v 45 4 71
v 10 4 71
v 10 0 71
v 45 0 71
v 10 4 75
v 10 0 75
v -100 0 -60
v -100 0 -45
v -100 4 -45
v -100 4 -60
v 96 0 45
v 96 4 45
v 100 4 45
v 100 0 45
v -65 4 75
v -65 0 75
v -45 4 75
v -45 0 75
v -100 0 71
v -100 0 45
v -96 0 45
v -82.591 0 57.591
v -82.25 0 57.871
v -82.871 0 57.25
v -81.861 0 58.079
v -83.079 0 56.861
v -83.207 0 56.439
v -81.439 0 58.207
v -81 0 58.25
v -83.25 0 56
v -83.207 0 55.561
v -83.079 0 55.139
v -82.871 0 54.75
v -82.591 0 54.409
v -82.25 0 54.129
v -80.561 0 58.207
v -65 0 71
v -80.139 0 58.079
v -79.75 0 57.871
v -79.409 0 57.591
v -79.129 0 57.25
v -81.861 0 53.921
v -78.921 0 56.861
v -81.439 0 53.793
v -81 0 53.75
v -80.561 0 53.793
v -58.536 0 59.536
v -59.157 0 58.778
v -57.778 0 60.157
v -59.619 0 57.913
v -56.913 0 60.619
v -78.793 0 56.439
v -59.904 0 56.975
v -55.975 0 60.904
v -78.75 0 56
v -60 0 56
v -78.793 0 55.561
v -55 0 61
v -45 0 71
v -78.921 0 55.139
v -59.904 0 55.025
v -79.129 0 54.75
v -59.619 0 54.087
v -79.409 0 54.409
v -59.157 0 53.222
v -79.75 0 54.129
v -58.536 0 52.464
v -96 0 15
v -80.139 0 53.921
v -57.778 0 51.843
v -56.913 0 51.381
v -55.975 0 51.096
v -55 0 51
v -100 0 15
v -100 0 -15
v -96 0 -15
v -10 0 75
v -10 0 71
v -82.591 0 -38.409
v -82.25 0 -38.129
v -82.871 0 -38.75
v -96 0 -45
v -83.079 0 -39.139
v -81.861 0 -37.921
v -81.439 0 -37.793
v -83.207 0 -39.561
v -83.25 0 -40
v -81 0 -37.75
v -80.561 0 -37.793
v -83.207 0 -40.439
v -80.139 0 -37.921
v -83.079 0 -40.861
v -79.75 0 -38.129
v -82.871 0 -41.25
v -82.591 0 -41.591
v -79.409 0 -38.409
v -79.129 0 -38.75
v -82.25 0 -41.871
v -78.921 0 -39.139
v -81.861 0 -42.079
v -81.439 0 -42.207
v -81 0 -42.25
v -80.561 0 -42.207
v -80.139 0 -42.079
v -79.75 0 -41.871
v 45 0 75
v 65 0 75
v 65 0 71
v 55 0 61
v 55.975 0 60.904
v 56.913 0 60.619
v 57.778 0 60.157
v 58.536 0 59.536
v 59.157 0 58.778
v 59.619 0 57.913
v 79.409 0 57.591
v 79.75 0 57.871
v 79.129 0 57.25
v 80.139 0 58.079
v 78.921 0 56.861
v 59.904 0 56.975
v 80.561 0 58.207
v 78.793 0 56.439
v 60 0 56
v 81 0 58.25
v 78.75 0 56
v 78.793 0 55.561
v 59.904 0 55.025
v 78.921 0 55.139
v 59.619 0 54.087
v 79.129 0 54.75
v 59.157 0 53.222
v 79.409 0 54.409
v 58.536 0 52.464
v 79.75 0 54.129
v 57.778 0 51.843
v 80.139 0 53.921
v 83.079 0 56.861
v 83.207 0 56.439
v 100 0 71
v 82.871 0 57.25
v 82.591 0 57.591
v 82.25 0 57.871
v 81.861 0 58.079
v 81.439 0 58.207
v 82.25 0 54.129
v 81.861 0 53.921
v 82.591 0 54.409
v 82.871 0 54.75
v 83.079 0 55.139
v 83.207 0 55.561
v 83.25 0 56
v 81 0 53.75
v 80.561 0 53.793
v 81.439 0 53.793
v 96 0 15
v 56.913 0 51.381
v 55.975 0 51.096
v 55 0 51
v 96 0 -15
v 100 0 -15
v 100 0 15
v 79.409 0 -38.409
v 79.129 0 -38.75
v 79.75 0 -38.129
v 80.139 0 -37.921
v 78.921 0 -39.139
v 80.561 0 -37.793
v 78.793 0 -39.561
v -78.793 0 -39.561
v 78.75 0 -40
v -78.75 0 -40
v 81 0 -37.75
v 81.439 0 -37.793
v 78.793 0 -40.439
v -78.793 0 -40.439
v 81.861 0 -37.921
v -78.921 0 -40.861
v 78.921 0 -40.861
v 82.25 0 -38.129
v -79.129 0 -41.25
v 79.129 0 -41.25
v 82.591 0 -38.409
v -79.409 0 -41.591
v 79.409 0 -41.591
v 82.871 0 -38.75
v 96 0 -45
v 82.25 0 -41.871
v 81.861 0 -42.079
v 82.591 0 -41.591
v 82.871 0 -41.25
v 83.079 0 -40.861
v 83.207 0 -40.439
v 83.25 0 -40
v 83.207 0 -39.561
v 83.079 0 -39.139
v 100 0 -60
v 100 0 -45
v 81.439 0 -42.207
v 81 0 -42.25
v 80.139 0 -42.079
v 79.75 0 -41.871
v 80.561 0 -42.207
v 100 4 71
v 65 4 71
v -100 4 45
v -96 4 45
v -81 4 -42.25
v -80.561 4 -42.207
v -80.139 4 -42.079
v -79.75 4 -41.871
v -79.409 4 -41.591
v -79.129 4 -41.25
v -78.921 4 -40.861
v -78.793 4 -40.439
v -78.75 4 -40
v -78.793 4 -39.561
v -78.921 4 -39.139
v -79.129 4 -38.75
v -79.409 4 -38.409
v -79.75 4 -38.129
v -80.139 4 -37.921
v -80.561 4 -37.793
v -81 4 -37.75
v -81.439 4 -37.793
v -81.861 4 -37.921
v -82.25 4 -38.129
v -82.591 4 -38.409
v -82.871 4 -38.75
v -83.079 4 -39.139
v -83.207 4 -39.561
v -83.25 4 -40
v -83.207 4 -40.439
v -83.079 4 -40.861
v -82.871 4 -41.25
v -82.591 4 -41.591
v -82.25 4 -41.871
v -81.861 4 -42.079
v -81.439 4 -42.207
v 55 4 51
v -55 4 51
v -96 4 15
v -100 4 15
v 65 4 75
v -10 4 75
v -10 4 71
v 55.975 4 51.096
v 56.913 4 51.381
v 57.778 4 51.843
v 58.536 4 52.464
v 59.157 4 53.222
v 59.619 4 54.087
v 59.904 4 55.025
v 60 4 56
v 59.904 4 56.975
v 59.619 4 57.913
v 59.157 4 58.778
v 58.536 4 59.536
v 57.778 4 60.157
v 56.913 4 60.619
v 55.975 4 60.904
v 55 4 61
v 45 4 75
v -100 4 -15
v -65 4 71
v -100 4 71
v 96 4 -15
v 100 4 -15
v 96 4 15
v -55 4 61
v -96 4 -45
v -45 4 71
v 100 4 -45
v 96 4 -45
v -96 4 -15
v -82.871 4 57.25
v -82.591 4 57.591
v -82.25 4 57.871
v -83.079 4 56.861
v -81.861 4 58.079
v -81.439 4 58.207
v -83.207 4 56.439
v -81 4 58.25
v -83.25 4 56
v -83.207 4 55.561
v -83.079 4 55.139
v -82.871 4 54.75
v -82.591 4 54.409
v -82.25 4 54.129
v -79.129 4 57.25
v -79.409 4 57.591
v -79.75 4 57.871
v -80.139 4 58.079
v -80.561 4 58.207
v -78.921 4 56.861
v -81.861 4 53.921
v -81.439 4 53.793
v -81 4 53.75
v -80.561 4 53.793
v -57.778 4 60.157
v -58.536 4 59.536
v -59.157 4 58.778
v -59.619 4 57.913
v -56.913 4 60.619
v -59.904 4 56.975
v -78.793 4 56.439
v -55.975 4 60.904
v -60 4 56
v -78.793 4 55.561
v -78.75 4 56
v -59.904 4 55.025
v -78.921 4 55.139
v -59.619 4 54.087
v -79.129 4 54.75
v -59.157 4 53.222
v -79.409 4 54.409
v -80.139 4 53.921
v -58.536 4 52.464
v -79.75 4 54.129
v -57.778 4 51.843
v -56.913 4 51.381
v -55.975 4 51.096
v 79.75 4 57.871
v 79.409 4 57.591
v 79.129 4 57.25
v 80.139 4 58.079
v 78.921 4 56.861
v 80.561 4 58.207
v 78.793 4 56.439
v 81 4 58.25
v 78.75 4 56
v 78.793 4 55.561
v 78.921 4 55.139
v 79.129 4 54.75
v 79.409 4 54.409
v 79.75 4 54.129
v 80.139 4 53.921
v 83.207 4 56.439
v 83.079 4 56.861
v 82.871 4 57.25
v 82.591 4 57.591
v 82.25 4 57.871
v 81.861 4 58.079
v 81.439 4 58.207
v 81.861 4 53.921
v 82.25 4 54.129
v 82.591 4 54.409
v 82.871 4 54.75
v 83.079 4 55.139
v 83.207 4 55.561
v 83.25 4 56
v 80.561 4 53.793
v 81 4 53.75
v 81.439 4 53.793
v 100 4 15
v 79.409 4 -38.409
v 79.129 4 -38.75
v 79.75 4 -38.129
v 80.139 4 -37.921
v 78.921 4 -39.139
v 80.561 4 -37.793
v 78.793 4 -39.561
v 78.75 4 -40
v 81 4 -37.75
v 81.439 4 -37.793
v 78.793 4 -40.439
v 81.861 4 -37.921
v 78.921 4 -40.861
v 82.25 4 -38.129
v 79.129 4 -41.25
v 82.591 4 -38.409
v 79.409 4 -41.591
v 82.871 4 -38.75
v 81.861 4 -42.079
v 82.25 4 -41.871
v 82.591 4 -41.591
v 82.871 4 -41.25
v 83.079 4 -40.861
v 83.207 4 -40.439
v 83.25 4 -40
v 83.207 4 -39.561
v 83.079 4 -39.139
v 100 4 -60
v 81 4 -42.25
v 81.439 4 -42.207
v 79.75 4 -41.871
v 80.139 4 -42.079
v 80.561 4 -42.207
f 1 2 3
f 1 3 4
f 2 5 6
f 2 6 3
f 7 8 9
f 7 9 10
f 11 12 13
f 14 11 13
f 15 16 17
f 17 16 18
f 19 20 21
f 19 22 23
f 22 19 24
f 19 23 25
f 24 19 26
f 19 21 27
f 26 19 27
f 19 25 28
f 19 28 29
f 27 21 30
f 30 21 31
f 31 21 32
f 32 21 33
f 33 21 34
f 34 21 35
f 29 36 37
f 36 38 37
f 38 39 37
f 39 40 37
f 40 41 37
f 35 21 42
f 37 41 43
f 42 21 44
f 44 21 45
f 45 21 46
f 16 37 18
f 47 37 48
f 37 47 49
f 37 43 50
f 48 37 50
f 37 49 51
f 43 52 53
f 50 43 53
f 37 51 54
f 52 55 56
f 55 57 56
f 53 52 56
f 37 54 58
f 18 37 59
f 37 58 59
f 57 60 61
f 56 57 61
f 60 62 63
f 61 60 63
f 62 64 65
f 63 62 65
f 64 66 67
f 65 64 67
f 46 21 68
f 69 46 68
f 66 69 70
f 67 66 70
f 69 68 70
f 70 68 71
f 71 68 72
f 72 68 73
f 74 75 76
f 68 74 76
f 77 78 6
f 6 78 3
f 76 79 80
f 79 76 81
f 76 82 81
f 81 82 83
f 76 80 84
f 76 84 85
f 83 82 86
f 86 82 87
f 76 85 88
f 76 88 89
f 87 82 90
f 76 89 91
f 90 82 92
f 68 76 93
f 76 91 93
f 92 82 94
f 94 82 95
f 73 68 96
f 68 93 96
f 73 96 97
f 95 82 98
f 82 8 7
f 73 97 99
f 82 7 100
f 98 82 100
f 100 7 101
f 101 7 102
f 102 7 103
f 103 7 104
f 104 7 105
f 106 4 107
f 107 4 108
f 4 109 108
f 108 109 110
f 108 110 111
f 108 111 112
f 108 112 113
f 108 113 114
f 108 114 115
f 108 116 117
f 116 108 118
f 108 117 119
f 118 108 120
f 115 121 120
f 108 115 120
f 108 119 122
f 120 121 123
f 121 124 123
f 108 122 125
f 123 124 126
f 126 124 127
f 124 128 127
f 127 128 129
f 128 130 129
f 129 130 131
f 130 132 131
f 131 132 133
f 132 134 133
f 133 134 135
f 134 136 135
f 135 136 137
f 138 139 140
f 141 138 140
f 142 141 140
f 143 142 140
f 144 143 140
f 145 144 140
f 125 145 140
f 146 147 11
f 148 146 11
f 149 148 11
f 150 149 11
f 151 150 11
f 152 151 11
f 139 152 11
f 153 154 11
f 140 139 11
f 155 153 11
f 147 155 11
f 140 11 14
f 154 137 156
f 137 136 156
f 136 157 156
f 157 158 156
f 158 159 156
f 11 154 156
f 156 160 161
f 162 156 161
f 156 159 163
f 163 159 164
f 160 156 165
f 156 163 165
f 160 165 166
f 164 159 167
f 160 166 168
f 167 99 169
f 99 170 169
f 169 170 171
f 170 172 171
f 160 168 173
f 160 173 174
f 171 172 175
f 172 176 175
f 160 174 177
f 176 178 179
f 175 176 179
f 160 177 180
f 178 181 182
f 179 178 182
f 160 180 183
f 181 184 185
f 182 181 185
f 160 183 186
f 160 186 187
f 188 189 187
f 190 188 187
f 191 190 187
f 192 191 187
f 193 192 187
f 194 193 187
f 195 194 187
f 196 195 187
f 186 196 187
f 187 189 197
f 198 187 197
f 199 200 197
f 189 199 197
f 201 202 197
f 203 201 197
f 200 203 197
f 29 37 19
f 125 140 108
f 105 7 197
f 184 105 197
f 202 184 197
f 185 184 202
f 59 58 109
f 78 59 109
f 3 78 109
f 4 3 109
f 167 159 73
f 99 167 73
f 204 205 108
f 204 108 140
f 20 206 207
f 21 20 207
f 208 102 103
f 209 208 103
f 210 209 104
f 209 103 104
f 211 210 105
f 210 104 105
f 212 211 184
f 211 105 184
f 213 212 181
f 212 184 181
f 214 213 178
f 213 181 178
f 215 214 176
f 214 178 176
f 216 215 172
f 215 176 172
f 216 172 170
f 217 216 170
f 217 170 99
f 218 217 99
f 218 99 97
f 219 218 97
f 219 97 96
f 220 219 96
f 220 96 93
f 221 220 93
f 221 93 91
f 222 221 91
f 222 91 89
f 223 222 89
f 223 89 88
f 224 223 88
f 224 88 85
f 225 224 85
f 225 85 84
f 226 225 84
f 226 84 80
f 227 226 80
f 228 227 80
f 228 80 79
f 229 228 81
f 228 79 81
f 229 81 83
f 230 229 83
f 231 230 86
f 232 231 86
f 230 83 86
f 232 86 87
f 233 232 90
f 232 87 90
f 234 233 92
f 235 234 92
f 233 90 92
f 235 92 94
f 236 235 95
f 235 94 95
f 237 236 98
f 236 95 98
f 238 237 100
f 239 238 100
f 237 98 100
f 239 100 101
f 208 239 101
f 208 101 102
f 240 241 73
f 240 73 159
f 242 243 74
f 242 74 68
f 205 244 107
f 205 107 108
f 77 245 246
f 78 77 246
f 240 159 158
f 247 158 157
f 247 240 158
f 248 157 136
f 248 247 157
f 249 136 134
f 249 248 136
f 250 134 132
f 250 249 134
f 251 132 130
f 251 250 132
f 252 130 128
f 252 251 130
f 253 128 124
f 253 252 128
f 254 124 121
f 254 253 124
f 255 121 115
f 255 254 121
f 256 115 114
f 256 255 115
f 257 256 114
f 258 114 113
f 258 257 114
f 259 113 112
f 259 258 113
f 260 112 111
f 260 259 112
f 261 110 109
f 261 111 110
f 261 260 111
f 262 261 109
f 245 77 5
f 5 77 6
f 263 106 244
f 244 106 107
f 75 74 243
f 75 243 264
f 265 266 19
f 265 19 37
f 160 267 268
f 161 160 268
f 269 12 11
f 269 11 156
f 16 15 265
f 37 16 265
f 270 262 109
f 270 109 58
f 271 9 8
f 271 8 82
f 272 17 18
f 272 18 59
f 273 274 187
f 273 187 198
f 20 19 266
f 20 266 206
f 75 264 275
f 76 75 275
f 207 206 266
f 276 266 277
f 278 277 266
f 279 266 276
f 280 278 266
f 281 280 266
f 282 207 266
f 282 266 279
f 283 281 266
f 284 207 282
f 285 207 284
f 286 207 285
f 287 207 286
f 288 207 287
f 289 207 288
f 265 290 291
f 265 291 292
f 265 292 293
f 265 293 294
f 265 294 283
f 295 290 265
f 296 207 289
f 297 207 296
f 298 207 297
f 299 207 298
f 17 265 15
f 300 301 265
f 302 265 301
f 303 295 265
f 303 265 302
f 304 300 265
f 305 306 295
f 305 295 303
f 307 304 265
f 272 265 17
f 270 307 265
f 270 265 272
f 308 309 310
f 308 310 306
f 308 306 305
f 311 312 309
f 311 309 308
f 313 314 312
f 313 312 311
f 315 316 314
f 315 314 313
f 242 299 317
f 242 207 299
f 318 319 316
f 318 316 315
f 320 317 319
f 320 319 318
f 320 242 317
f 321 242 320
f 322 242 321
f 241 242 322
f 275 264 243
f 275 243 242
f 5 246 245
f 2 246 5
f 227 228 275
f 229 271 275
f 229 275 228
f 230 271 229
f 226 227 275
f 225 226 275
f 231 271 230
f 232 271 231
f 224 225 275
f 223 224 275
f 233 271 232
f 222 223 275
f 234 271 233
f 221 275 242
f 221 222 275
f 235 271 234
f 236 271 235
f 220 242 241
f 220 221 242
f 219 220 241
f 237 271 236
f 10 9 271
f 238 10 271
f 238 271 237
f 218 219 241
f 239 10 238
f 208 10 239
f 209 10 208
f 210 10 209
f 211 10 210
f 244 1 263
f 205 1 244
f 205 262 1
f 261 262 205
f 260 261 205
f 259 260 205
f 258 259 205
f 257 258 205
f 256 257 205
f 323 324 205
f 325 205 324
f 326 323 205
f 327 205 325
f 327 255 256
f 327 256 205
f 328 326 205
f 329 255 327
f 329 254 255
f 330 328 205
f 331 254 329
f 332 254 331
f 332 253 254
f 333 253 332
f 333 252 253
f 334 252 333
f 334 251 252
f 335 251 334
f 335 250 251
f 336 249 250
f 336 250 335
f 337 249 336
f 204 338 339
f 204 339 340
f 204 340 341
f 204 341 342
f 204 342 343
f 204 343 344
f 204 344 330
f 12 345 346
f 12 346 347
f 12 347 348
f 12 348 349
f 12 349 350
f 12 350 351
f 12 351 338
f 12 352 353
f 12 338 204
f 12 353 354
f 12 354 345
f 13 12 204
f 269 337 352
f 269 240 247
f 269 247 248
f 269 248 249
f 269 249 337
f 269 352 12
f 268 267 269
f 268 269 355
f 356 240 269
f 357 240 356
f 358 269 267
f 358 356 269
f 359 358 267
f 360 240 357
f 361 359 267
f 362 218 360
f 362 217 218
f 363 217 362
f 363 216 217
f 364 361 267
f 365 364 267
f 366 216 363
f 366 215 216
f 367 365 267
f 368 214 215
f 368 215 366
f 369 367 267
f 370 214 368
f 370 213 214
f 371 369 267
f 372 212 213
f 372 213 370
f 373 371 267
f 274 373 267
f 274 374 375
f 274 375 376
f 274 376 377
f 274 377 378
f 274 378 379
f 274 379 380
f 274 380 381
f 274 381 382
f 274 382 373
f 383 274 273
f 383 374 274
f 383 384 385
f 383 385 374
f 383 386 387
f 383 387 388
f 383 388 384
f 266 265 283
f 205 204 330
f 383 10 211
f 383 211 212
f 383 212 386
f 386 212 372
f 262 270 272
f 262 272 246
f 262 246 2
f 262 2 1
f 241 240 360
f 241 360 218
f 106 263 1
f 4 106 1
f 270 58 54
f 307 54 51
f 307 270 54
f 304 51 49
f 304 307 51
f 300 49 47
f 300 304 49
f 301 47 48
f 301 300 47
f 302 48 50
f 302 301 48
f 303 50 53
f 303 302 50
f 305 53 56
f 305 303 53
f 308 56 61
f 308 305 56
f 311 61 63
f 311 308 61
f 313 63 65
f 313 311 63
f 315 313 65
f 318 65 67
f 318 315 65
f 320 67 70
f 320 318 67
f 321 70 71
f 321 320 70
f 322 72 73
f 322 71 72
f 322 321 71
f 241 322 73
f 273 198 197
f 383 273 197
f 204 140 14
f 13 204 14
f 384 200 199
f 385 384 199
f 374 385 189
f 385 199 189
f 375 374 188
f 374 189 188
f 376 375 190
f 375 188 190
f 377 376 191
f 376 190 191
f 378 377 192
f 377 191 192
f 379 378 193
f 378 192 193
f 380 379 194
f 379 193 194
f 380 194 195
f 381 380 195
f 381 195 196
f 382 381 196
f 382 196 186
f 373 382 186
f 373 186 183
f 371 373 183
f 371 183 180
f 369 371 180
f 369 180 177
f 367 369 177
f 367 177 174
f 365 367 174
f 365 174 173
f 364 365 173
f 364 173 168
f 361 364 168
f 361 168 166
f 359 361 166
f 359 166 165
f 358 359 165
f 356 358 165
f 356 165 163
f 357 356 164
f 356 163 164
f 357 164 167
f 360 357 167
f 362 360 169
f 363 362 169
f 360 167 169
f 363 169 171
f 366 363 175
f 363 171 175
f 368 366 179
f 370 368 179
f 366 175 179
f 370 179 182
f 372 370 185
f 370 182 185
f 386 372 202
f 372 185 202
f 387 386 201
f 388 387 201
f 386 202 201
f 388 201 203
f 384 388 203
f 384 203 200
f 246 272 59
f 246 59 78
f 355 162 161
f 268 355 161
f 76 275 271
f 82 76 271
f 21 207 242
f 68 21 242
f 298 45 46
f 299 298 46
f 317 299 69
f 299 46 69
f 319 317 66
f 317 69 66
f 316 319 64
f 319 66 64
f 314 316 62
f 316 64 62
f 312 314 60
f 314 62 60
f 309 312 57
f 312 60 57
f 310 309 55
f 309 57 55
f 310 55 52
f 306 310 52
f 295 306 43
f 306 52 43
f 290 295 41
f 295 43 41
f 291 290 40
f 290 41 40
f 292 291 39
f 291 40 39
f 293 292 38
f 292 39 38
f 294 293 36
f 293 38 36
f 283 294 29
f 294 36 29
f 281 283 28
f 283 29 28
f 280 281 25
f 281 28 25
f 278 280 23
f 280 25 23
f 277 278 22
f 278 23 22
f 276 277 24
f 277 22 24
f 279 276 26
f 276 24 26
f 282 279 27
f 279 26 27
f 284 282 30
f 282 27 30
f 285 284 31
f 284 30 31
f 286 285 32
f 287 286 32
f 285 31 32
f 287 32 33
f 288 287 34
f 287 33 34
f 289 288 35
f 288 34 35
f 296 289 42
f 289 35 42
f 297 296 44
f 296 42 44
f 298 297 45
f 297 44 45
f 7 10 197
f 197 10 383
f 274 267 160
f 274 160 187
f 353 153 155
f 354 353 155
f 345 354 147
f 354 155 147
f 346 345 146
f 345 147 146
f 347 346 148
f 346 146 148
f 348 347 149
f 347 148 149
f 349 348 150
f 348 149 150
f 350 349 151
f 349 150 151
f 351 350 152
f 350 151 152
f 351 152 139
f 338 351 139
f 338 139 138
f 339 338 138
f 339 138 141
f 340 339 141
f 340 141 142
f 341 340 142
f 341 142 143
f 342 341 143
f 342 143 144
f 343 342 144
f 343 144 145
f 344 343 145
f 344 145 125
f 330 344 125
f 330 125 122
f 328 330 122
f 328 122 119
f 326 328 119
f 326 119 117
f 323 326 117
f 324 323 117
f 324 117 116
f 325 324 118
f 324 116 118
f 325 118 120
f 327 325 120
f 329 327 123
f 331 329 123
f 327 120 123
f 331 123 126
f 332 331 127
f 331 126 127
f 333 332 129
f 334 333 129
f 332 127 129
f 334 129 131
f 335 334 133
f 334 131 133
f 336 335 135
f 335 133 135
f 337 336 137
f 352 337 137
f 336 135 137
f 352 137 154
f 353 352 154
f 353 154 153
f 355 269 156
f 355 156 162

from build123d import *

# Parameters (mm, degrees)
ESBO_O1_W                               = 200
ESBO_O1_H                               = 150
RESSALTO_EXTRUS_O1_DEPTH                = 4
ESBO_O2_W                               = 35
ESBO_O2_H                               = 4
ESBO_O2_W_2                             = 4
ESBO_O2_H_2                             = 30
CORTE_EXTRUS_O1_DEPTH                   = 5
ESBO_O3_W                               = 200
ESBO_O3_H                               = 15
CORTE_EXTRUS_O2_DEPTH                   = 5
BROCA_DE_ROSQUEAR_PARA_TARRAXA_DE_M41_D = 4.5
ESBO_O5_R                               = 2.25
CORTE_EXTRUS_O3_DEPTH                   = 5


with BuildPart() as part:
    # Esboço1 → Ressalto-extrusão1 (new body)
    with BuildSketch(Plane(origin=(0, 0, 0), x_dir=(1, 0, 0), z_dir=(0, 1, 0))):
        Rectangle(ESBO_O1_W, ESBO_O1_H)
    extrude(amount=RESSALTO_EXTRUS_O1_DEPTH)

    # Esboço2 → Corte-extrusão1 (cut, through all)
    with BuildSketch(Plane(origin=(0, 4, 0), x_dir=(1, 0, 0), z_dir=(0, 1, 0))):
        with Locations((-27.5, -73)):
            Rectangle(ESBO_O2_W, ESBO_O2_H)
        with Locations((27.5, -73)):
            Rectangle(ESBO_O2_W, ESBO_O2_H)
        with Locations((82.5, -73)):
            Rectangle(ESBO_O2_W, ESBO_O2_H)
        with Locations((-82.5, -73)):
            Rectangle(ESBO_O2_W, ESBO_O2_H)
        with Locations((98, 30)):
            Rectangle(ESBO_O2_W_2, ESBO_O2_H_2)
        with Locations((98, -30)):
            Rectangle(ESBO_O2_W_2, ESBO_O2_H_2)
        with Locations((-98, 30)):
            Rectangle(ESBO_O2_W_2, ESBO_O2_H_2)
        with Locations((-98, -30)):
            Rectangle(ESBO_O2_W_2, ESBO_O2_H_2)
    extrude(amount=-CORTE_EXTRUS_O1_DEPTH, mode=Mode.SUBTRACT)

    # Esboço3 → Corte-extrusão2 (cut, through all)
    with BuildSketch(Plane(origin=(0, 4, 0), x_dir=(1, 0, 0), z_dir=(0, 1, 0))):
        with Locations((0, 67.5)):
            Rectangle(ESBO_O3_W, ESBO_O3_H)
    extrude(amount=-CORTE_EXTRUS_O2_DEPTH, mode=Mode.SUBTRACT)

    # Broca de rosquear para tarraxa de M41 (through all)
    with Locations(Plane(origin=(-81, 4, -40), x_dir=(0, 0, 1), z_dir=(0, 1, 0))):
        with Locations((0, 0), (96, 0), (96, 162), (0, 162)):
            Hole(BROCA_DE_ROSQUEAR_PARA_TARRAXA_DE_M41_D / 2)

    # Esboço5 → Corte-extrusão3 (cut, through all)
    with BuildSketch(Plane(origin=(0, 4, 0), x_dir=(1, 0, 0), z_dir=(0, 1, 0))):
        with Locations((-81, -56)):
            Circle(ESBO_O5_R)
        with BuildLine():
            Line((55, -61), (-55, -61))
            ThreePointArc((-55, -61), (-60, -56), (-55, -51))
            Line((-55, -51), (55, -51))
            ThreePointArc((55, -51), (60, -56), (55, -61))
        make_face()
    extrude(amount=-CORTE_EXTRUS_O3_DEPTH, mode=Mode.SUBTRACT)


solid = part.part
